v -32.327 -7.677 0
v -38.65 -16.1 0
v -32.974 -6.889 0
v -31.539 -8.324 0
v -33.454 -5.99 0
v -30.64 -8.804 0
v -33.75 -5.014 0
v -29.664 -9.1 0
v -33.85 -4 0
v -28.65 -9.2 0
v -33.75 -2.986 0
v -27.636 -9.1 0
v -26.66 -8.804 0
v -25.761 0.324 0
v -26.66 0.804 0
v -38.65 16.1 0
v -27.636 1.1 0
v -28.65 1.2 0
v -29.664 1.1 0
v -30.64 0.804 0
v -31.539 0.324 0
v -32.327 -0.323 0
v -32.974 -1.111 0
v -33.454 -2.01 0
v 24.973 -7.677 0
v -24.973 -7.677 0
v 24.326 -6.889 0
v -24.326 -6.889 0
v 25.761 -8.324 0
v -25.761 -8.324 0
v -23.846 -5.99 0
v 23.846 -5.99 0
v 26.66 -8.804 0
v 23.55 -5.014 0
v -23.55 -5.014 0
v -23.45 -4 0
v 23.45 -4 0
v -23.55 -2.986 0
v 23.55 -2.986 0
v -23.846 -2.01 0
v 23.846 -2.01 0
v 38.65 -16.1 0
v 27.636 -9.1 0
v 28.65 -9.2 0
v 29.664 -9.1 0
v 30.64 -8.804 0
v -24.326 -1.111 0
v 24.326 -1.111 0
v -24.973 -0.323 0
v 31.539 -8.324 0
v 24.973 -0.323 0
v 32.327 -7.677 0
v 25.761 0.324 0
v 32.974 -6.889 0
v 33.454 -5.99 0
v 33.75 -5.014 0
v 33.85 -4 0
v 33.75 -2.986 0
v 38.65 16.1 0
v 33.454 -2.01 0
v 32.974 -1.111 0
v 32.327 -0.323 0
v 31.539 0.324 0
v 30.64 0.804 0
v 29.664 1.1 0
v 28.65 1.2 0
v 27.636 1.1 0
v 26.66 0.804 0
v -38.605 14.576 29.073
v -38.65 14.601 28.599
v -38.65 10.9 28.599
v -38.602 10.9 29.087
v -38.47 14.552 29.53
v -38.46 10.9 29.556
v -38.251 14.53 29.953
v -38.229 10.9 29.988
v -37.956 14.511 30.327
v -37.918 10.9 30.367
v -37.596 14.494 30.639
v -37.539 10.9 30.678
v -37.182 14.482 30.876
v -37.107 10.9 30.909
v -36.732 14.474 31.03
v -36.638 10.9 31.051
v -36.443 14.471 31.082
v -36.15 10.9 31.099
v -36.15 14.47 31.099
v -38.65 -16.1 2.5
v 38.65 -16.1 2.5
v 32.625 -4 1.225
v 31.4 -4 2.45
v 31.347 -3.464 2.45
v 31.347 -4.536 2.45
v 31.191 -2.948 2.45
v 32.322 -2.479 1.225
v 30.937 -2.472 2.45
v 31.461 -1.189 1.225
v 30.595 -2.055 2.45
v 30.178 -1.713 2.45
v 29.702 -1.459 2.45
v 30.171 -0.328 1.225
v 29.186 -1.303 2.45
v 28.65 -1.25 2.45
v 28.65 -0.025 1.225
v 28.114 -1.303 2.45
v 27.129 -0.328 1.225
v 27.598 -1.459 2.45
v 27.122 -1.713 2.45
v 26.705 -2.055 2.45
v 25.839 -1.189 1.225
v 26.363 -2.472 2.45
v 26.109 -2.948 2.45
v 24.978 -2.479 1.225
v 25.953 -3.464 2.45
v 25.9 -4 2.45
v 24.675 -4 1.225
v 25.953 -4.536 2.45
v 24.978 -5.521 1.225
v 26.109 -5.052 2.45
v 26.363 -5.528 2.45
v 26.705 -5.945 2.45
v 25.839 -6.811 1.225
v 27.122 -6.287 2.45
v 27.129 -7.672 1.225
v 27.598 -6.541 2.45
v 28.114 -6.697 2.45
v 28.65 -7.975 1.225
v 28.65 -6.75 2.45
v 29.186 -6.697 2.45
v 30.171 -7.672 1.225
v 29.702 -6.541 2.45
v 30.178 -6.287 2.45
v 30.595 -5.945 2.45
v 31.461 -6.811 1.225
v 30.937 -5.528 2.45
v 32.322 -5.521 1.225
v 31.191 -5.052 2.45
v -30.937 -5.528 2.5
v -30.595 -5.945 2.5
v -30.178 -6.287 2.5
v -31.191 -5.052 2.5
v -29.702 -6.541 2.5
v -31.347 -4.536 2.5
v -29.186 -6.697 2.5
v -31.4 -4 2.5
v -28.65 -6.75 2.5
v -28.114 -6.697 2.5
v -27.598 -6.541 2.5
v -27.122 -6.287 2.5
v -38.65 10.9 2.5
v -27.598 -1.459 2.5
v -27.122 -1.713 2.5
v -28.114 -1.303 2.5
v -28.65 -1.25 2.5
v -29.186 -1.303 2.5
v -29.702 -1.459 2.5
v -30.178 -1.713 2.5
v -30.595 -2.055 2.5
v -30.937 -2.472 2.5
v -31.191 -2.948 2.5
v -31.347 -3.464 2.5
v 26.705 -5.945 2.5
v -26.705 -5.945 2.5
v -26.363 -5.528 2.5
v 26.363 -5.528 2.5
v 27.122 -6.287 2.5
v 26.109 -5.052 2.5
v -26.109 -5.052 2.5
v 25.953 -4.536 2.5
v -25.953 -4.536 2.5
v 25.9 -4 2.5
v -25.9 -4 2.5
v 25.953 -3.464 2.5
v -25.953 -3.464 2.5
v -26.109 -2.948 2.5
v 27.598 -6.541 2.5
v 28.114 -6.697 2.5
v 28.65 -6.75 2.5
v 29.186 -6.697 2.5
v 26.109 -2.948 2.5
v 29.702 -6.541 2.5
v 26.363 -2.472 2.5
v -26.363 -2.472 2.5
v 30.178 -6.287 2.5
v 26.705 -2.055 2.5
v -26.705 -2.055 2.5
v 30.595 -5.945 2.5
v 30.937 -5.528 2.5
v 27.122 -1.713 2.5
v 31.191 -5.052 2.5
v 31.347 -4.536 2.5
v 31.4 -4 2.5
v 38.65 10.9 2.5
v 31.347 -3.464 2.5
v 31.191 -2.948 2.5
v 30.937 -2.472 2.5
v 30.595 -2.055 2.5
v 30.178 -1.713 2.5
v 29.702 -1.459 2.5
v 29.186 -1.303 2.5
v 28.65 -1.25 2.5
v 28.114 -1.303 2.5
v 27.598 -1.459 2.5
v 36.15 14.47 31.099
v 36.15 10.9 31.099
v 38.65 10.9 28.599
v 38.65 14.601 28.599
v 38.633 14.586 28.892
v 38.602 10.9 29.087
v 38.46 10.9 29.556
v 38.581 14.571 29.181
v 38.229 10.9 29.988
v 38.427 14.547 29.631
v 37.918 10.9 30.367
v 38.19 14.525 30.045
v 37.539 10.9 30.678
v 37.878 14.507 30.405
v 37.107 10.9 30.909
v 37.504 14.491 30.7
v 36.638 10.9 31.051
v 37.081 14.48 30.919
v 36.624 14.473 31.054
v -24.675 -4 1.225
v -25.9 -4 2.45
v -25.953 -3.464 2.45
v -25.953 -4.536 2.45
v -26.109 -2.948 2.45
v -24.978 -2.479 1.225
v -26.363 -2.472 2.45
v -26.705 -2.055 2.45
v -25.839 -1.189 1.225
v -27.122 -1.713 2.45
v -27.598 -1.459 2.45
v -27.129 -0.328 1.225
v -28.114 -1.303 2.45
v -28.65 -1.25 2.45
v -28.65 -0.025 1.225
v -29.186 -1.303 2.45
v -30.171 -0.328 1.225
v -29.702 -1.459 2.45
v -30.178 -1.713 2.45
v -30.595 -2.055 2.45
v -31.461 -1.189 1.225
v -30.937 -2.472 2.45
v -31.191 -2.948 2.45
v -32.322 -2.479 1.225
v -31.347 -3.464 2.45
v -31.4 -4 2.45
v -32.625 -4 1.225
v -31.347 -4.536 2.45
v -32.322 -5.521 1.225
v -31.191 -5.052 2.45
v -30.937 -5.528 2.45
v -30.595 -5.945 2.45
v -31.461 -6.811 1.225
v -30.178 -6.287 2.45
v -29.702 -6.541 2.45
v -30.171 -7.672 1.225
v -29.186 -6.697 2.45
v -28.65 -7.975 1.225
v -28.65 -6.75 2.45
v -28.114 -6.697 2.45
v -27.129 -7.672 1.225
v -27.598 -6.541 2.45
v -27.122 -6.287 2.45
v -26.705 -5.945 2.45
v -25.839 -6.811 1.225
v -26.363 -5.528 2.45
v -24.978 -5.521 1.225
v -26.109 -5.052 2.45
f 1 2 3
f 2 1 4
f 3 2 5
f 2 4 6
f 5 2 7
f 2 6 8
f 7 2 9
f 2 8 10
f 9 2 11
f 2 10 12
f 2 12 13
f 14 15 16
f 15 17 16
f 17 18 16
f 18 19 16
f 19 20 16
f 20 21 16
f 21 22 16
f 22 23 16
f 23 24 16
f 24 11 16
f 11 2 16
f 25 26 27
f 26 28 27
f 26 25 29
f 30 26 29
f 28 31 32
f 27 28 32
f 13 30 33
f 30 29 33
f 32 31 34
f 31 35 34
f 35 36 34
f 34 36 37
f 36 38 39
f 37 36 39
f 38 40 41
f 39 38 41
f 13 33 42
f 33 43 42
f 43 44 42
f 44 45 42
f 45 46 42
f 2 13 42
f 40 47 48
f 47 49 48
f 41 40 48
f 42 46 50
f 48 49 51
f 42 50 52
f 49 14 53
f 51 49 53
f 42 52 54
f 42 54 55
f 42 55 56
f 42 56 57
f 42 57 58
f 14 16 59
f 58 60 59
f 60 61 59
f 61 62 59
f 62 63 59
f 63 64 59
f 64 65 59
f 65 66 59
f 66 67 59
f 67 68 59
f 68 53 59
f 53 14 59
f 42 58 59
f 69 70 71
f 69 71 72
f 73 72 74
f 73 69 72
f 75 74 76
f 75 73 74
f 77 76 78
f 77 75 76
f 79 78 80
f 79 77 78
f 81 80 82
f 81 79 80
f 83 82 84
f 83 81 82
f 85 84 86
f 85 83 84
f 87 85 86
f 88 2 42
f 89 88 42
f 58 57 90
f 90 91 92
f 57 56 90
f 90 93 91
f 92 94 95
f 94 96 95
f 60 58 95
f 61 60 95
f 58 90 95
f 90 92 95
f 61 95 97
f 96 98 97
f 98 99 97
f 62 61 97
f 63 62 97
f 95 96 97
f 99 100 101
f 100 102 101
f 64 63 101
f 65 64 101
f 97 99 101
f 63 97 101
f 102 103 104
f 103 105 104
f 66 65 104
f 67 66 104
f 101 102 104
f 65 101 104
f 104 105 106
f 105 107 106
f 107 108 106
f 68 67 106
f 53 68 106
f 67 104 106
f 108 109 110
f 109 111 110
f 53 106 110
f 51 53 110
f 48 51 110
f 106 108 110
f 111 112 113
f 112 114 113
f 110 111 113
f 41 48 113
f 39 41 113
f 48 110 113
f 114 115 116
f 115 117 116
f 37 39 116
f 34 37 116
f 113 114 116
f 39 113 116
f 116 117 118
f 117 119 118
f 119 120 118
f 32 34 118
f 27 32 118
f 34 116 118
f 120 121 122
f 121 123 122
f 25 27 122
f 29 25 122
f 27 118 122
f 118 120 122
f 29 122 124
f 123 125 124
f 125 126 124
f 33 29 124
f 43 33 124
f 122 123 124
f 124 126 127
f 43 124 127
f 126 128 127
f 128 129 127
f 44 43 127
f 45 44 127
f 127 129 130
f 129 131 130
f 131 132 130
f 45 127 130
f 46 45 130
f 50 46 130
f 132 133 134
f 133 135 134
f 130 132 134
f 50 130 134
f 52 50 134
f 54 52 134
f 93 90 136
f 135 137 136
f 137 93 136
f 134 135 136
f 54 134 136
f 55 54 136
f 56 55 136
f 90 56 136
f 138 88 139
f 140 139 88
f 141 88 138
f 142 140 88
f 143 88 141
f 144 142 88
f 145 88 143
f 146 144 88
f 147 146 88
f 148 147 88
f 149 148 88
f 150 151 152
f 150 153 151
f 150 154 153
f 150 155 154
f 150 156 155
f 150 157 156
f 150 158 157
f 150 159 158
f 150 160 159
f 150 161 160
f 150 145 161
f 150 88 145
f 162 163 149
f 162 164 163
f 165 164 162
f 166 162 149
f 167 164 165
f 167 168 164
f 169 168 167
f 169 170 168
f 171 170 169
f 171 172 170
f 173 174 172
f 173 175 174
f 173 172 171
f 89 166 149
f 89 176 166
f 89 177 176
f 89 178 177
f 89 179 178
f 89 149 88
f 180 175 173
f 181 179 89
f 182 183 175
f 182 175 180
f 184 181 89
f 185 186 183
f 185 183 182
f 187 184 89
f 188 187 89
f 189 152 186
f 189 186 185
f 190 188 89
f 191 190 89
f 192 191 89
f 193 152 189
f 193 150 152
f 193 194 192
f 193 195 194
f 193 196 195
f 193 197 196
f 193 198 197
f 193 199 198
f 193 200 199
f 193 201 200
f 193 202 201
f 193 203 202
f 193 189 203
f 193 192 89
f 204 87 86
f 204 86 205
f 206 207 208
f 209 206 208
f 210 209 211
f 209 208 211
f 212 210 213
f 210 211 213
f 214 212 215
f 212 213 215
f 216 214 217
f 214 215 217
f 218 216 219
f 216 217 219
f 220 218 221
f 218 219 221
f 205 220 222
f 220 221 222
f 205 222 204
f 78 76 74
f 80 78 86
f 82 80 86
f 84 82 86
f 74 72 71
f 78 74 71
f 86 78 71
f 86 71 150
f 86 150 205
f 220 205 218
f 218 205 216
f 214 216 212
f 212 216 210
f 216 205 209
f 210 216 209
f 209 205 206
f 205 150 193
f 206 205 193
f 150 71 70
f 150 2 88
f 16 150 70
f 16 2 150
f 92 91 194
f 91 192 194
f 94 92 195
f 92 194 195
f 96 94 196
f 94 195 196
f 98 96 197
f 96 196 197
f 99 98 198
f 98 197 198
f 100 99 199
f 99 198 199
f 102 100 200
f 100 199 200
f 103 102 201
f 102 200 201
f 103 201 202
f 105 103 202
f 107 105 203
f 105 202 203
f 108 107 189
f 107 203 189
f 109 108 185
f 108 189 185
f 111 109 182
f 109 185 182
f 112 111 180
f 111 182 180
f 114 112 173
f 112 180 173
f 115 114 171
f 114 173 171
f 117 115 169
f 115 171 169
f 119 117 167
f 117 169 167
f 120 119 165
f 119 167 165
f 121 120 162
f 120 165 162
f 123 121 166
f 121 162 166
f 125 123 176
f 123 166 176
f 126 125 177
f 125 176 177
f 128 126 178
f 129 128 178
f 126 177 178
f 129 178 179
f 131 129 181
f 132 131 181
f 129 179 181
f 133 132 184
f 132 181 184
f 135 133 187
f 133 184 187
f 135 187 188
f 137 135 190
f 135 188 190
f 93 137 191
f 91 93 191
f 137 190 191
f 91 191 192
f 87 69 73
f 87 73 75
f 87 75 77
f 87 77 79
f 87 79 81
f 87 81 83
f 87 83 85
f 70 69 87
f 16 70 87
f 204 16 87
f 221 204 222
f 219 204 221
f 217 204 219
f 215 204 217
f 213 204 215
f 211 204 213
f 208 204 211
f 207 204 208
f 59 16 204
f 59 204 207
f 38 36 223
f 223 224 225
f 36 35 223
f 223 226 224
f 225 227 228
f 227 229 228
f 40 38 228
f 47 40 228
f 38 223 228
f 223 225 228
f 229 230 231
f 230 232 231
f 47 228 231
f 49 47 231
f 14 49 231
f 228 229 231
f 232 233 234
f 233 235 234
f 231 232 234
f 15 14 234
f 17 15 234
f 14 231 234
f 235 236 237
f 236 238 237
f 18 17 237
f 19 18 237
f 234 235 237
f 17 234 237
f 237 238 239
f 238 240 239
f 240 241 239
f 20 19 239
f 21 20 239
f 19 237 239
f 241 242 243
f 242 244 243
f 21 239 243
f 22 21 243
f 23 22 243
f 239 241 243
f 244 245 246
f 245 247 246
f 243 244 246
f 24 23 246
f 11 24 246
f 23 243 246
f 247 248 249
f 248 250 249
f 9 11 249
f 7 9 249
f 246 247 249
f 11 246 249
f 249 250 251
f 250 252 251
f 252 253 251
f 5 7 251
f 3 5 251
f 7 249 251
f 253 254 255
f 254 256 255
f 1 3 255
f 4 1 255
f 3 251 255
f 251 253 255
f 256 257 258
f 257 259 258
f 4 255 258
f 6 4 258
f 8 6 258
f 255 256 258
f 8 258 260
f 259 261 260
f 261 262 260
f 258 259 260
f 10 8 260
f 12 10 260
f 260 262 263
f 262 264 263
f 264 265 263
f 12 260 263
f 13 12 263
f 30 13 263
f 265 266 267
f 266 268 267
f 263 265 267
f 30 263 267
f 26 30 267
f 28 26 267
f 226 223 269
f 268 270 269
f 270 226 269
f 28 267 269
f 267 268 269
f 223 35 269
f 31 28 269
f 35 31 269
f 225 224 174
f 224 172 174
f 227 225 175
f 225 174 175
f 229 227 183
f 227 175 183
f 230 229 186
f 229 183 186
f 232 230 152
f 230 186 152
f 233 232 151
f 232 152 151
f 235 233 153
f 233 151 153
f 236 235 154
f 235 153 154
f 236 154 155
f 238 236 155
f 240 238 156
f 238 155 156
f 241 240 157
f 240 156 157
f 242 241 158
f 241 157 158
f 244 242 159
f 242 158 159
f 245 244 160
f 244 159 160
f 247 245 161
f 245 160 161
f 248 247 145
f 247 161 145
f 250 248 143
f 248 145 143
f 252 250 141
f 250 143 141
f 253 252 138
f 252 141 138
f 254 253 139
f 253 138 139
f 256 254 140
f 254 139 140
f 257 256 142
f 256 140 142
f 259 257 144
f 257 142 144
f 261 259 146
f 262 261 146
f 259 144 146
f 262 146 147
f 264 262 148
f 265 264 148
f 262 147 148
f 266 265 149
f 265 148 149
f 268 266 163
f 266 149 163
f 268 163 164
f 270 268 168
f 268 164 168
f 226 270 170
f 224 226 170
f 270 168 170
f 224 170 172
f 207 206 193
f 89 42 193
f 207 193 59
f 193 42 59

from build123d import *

# Parameters (mm, degrees)
SKETCH1_W                                       = 77.3
SKETCH1_H                                       = 32.2
BOSS_EXTRUDE1_DEPTH                             = 2.5
SKETCH3_W                                       = 77.3
SKETCH3_H                                       = 5.2
BOSS_EXTRUDE2_DEPTH                             = 28.599
FILLET1_R                                       = 2.5
SKETCH4_W                                       = 77.3
SKETCH4_H                                       = 37.342788029
CUT_REVOLVE2_ANGLE                              = 3
CSK_FOR_M5_FLAT_HEAD_MACHINE_SCREW1_D           = 5.5
CSK_FOR_M5_FLAT_HEAD_MACHINE_SCREW1_DEPTH       = 12.4
CSK_FOR_M5_FLAT_HEAD_MACHINE_SCREW1_CSINK_D     = 10.4
CSK_FOR_M5_FLAT_HEAD_MACHINE_SCREW1_CSINK_ANGLE = 90
CSK_FOR_M5_FLAT_HEAD_MACHINE_SCREW1_TIP         = 1.652366702


with BuildPart() as part:
    # Sketch1 → Boss-Extrude1 (new body)
    with BuildSketch(Plane.XY):
        Rectangle(SKETCH1_W, SKETCH1_H)
    extrude(amount=BOSS_EXTRUDE1_DEPTH)

    # Sketch3 → Boss-Extrude2 (add)
    with BuildSketch(Plane.XY.offset(2.5)):
        with Locations((0, 13.5)):
            Rectangle(SKETCH3_W, SKETCH3_H)
    extrude(amount=BOSS_EXTRUDE2_DEPTH)

    # Fillet1
    fillet1_edges = [part.edges().sort_by_distance(p)[0] for p in [
        (-38.65, 13.5, 31.099),
        (38.65, 13.5, 31.099),
    ]]
    fillet(fillet1_edges, radius=FILLET1_R)

    # Sketch4 → Cut-Revolve2 (revolve, cut)
    with BuildSketch(Plane(origin=(0, 16.1, 0), x_dir=(1, 0, 0), z_dir=(0, 1, 0))):
        with Locations((0, -18.671394015)):
            Rectangle(SKETCH4_W, SKETCH4_H)
    revolve(axis=Axis((-38.65, 16.1, 0), (1, 0, 0)), revolution_arc=CUT_REVOLVE2_ANGLE, mode=Mode.SUBTRACT)

    # CSK for M5 Flat Head Machine Screw1
    with Locations(Plane(origin=(0, 0, 0), x_dir=(-1, 0, 0), z_dir=(0, 0, -1))):
        with Locations((-28.65, -4), (28.65, -4)):
            CounterSinkHole(CSK_FOR_M5_FLAT_HEAD_MACHINE_SCREW1_D / 2, CSK_FOR_M5_FLAT_HEAD_MACHINE_SCREW1_CSINK_D / 2, depth=CSK_FOR_M5_FLAT_HEAD_MACHINE_SCREW1_DEPTH, counter_sink_angle=CSK_FOR_M5_FLAT_HEAD_MACHINE_SCREW1_CSINK_ANGLE)
            with Locations((0, 0, -(CSK_FOR_M5_FLAT_HEAD_MACHINE_SCREW1_DEPTH + CSK_FOR_M5_FLAT_HEAD_MACHINE_SCREW1_TIP / 2))):  # 118° drill point
                Cone(0, CSK_FOR_M5_FLAT_HEAD_MACHINE_SCREW1_D / 2, CSK_FOR_M5_FLAT_HEAD_MACHINE_SCREW1_TIP, mode=Mode.SUBTRACT)


solid = part.part
